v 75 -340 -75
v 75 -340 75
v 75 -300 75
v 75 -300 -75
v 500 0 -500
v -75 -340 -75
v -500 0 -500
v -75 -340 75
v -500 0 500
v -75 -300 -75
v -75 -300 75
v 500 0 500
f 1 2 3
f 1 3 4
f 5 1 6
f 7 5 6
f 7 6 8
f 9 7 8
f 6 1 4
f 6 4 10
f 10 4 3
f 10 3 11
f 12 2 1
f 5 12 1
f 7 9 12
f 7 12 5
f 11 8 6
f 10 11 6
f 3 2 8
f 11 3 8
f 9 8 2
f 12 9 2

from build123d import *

# Parameters (mm, degrees)
SKETCH5_W          = 150
SKETCH5_H          = 150
CUT_EXTRUDE1_DEPTH = 100


with BuildPart() as part:
    # Sketch1 → Loft1 section 0
    with BuildSketch(Plane(origin=(0, 0, 0), x_dir=(1, 0, 0), z_dir=(0, 1, 0)), mode=Mode.PRIVATE) as loft1_s0:
        with BuildLine():
            Line((-500, -500), (500, -500))
            Line((500, -500), (500, 500))
            Line((500, 500), (-500, 500))
            Line((-500, 500), (-500, -500))
        make_face()
    loft([loft1_s0.sketch, Vertex(0, -400, 0)])

    # Sketch5 → Cut-Extrude1 (cut)
    with BuildSketch(Plane(origin=(0, -400, 0), x_dir=(-1, 0, 0), z_dir=(0, -1, 0))):
        Rectangle(SKETCH5_W, SKETCH5_H)
    extrude(amount=-CUT_EXTRUDE1_DEPTH, mode=Mode.SUBTRACT)


solid = part.part
